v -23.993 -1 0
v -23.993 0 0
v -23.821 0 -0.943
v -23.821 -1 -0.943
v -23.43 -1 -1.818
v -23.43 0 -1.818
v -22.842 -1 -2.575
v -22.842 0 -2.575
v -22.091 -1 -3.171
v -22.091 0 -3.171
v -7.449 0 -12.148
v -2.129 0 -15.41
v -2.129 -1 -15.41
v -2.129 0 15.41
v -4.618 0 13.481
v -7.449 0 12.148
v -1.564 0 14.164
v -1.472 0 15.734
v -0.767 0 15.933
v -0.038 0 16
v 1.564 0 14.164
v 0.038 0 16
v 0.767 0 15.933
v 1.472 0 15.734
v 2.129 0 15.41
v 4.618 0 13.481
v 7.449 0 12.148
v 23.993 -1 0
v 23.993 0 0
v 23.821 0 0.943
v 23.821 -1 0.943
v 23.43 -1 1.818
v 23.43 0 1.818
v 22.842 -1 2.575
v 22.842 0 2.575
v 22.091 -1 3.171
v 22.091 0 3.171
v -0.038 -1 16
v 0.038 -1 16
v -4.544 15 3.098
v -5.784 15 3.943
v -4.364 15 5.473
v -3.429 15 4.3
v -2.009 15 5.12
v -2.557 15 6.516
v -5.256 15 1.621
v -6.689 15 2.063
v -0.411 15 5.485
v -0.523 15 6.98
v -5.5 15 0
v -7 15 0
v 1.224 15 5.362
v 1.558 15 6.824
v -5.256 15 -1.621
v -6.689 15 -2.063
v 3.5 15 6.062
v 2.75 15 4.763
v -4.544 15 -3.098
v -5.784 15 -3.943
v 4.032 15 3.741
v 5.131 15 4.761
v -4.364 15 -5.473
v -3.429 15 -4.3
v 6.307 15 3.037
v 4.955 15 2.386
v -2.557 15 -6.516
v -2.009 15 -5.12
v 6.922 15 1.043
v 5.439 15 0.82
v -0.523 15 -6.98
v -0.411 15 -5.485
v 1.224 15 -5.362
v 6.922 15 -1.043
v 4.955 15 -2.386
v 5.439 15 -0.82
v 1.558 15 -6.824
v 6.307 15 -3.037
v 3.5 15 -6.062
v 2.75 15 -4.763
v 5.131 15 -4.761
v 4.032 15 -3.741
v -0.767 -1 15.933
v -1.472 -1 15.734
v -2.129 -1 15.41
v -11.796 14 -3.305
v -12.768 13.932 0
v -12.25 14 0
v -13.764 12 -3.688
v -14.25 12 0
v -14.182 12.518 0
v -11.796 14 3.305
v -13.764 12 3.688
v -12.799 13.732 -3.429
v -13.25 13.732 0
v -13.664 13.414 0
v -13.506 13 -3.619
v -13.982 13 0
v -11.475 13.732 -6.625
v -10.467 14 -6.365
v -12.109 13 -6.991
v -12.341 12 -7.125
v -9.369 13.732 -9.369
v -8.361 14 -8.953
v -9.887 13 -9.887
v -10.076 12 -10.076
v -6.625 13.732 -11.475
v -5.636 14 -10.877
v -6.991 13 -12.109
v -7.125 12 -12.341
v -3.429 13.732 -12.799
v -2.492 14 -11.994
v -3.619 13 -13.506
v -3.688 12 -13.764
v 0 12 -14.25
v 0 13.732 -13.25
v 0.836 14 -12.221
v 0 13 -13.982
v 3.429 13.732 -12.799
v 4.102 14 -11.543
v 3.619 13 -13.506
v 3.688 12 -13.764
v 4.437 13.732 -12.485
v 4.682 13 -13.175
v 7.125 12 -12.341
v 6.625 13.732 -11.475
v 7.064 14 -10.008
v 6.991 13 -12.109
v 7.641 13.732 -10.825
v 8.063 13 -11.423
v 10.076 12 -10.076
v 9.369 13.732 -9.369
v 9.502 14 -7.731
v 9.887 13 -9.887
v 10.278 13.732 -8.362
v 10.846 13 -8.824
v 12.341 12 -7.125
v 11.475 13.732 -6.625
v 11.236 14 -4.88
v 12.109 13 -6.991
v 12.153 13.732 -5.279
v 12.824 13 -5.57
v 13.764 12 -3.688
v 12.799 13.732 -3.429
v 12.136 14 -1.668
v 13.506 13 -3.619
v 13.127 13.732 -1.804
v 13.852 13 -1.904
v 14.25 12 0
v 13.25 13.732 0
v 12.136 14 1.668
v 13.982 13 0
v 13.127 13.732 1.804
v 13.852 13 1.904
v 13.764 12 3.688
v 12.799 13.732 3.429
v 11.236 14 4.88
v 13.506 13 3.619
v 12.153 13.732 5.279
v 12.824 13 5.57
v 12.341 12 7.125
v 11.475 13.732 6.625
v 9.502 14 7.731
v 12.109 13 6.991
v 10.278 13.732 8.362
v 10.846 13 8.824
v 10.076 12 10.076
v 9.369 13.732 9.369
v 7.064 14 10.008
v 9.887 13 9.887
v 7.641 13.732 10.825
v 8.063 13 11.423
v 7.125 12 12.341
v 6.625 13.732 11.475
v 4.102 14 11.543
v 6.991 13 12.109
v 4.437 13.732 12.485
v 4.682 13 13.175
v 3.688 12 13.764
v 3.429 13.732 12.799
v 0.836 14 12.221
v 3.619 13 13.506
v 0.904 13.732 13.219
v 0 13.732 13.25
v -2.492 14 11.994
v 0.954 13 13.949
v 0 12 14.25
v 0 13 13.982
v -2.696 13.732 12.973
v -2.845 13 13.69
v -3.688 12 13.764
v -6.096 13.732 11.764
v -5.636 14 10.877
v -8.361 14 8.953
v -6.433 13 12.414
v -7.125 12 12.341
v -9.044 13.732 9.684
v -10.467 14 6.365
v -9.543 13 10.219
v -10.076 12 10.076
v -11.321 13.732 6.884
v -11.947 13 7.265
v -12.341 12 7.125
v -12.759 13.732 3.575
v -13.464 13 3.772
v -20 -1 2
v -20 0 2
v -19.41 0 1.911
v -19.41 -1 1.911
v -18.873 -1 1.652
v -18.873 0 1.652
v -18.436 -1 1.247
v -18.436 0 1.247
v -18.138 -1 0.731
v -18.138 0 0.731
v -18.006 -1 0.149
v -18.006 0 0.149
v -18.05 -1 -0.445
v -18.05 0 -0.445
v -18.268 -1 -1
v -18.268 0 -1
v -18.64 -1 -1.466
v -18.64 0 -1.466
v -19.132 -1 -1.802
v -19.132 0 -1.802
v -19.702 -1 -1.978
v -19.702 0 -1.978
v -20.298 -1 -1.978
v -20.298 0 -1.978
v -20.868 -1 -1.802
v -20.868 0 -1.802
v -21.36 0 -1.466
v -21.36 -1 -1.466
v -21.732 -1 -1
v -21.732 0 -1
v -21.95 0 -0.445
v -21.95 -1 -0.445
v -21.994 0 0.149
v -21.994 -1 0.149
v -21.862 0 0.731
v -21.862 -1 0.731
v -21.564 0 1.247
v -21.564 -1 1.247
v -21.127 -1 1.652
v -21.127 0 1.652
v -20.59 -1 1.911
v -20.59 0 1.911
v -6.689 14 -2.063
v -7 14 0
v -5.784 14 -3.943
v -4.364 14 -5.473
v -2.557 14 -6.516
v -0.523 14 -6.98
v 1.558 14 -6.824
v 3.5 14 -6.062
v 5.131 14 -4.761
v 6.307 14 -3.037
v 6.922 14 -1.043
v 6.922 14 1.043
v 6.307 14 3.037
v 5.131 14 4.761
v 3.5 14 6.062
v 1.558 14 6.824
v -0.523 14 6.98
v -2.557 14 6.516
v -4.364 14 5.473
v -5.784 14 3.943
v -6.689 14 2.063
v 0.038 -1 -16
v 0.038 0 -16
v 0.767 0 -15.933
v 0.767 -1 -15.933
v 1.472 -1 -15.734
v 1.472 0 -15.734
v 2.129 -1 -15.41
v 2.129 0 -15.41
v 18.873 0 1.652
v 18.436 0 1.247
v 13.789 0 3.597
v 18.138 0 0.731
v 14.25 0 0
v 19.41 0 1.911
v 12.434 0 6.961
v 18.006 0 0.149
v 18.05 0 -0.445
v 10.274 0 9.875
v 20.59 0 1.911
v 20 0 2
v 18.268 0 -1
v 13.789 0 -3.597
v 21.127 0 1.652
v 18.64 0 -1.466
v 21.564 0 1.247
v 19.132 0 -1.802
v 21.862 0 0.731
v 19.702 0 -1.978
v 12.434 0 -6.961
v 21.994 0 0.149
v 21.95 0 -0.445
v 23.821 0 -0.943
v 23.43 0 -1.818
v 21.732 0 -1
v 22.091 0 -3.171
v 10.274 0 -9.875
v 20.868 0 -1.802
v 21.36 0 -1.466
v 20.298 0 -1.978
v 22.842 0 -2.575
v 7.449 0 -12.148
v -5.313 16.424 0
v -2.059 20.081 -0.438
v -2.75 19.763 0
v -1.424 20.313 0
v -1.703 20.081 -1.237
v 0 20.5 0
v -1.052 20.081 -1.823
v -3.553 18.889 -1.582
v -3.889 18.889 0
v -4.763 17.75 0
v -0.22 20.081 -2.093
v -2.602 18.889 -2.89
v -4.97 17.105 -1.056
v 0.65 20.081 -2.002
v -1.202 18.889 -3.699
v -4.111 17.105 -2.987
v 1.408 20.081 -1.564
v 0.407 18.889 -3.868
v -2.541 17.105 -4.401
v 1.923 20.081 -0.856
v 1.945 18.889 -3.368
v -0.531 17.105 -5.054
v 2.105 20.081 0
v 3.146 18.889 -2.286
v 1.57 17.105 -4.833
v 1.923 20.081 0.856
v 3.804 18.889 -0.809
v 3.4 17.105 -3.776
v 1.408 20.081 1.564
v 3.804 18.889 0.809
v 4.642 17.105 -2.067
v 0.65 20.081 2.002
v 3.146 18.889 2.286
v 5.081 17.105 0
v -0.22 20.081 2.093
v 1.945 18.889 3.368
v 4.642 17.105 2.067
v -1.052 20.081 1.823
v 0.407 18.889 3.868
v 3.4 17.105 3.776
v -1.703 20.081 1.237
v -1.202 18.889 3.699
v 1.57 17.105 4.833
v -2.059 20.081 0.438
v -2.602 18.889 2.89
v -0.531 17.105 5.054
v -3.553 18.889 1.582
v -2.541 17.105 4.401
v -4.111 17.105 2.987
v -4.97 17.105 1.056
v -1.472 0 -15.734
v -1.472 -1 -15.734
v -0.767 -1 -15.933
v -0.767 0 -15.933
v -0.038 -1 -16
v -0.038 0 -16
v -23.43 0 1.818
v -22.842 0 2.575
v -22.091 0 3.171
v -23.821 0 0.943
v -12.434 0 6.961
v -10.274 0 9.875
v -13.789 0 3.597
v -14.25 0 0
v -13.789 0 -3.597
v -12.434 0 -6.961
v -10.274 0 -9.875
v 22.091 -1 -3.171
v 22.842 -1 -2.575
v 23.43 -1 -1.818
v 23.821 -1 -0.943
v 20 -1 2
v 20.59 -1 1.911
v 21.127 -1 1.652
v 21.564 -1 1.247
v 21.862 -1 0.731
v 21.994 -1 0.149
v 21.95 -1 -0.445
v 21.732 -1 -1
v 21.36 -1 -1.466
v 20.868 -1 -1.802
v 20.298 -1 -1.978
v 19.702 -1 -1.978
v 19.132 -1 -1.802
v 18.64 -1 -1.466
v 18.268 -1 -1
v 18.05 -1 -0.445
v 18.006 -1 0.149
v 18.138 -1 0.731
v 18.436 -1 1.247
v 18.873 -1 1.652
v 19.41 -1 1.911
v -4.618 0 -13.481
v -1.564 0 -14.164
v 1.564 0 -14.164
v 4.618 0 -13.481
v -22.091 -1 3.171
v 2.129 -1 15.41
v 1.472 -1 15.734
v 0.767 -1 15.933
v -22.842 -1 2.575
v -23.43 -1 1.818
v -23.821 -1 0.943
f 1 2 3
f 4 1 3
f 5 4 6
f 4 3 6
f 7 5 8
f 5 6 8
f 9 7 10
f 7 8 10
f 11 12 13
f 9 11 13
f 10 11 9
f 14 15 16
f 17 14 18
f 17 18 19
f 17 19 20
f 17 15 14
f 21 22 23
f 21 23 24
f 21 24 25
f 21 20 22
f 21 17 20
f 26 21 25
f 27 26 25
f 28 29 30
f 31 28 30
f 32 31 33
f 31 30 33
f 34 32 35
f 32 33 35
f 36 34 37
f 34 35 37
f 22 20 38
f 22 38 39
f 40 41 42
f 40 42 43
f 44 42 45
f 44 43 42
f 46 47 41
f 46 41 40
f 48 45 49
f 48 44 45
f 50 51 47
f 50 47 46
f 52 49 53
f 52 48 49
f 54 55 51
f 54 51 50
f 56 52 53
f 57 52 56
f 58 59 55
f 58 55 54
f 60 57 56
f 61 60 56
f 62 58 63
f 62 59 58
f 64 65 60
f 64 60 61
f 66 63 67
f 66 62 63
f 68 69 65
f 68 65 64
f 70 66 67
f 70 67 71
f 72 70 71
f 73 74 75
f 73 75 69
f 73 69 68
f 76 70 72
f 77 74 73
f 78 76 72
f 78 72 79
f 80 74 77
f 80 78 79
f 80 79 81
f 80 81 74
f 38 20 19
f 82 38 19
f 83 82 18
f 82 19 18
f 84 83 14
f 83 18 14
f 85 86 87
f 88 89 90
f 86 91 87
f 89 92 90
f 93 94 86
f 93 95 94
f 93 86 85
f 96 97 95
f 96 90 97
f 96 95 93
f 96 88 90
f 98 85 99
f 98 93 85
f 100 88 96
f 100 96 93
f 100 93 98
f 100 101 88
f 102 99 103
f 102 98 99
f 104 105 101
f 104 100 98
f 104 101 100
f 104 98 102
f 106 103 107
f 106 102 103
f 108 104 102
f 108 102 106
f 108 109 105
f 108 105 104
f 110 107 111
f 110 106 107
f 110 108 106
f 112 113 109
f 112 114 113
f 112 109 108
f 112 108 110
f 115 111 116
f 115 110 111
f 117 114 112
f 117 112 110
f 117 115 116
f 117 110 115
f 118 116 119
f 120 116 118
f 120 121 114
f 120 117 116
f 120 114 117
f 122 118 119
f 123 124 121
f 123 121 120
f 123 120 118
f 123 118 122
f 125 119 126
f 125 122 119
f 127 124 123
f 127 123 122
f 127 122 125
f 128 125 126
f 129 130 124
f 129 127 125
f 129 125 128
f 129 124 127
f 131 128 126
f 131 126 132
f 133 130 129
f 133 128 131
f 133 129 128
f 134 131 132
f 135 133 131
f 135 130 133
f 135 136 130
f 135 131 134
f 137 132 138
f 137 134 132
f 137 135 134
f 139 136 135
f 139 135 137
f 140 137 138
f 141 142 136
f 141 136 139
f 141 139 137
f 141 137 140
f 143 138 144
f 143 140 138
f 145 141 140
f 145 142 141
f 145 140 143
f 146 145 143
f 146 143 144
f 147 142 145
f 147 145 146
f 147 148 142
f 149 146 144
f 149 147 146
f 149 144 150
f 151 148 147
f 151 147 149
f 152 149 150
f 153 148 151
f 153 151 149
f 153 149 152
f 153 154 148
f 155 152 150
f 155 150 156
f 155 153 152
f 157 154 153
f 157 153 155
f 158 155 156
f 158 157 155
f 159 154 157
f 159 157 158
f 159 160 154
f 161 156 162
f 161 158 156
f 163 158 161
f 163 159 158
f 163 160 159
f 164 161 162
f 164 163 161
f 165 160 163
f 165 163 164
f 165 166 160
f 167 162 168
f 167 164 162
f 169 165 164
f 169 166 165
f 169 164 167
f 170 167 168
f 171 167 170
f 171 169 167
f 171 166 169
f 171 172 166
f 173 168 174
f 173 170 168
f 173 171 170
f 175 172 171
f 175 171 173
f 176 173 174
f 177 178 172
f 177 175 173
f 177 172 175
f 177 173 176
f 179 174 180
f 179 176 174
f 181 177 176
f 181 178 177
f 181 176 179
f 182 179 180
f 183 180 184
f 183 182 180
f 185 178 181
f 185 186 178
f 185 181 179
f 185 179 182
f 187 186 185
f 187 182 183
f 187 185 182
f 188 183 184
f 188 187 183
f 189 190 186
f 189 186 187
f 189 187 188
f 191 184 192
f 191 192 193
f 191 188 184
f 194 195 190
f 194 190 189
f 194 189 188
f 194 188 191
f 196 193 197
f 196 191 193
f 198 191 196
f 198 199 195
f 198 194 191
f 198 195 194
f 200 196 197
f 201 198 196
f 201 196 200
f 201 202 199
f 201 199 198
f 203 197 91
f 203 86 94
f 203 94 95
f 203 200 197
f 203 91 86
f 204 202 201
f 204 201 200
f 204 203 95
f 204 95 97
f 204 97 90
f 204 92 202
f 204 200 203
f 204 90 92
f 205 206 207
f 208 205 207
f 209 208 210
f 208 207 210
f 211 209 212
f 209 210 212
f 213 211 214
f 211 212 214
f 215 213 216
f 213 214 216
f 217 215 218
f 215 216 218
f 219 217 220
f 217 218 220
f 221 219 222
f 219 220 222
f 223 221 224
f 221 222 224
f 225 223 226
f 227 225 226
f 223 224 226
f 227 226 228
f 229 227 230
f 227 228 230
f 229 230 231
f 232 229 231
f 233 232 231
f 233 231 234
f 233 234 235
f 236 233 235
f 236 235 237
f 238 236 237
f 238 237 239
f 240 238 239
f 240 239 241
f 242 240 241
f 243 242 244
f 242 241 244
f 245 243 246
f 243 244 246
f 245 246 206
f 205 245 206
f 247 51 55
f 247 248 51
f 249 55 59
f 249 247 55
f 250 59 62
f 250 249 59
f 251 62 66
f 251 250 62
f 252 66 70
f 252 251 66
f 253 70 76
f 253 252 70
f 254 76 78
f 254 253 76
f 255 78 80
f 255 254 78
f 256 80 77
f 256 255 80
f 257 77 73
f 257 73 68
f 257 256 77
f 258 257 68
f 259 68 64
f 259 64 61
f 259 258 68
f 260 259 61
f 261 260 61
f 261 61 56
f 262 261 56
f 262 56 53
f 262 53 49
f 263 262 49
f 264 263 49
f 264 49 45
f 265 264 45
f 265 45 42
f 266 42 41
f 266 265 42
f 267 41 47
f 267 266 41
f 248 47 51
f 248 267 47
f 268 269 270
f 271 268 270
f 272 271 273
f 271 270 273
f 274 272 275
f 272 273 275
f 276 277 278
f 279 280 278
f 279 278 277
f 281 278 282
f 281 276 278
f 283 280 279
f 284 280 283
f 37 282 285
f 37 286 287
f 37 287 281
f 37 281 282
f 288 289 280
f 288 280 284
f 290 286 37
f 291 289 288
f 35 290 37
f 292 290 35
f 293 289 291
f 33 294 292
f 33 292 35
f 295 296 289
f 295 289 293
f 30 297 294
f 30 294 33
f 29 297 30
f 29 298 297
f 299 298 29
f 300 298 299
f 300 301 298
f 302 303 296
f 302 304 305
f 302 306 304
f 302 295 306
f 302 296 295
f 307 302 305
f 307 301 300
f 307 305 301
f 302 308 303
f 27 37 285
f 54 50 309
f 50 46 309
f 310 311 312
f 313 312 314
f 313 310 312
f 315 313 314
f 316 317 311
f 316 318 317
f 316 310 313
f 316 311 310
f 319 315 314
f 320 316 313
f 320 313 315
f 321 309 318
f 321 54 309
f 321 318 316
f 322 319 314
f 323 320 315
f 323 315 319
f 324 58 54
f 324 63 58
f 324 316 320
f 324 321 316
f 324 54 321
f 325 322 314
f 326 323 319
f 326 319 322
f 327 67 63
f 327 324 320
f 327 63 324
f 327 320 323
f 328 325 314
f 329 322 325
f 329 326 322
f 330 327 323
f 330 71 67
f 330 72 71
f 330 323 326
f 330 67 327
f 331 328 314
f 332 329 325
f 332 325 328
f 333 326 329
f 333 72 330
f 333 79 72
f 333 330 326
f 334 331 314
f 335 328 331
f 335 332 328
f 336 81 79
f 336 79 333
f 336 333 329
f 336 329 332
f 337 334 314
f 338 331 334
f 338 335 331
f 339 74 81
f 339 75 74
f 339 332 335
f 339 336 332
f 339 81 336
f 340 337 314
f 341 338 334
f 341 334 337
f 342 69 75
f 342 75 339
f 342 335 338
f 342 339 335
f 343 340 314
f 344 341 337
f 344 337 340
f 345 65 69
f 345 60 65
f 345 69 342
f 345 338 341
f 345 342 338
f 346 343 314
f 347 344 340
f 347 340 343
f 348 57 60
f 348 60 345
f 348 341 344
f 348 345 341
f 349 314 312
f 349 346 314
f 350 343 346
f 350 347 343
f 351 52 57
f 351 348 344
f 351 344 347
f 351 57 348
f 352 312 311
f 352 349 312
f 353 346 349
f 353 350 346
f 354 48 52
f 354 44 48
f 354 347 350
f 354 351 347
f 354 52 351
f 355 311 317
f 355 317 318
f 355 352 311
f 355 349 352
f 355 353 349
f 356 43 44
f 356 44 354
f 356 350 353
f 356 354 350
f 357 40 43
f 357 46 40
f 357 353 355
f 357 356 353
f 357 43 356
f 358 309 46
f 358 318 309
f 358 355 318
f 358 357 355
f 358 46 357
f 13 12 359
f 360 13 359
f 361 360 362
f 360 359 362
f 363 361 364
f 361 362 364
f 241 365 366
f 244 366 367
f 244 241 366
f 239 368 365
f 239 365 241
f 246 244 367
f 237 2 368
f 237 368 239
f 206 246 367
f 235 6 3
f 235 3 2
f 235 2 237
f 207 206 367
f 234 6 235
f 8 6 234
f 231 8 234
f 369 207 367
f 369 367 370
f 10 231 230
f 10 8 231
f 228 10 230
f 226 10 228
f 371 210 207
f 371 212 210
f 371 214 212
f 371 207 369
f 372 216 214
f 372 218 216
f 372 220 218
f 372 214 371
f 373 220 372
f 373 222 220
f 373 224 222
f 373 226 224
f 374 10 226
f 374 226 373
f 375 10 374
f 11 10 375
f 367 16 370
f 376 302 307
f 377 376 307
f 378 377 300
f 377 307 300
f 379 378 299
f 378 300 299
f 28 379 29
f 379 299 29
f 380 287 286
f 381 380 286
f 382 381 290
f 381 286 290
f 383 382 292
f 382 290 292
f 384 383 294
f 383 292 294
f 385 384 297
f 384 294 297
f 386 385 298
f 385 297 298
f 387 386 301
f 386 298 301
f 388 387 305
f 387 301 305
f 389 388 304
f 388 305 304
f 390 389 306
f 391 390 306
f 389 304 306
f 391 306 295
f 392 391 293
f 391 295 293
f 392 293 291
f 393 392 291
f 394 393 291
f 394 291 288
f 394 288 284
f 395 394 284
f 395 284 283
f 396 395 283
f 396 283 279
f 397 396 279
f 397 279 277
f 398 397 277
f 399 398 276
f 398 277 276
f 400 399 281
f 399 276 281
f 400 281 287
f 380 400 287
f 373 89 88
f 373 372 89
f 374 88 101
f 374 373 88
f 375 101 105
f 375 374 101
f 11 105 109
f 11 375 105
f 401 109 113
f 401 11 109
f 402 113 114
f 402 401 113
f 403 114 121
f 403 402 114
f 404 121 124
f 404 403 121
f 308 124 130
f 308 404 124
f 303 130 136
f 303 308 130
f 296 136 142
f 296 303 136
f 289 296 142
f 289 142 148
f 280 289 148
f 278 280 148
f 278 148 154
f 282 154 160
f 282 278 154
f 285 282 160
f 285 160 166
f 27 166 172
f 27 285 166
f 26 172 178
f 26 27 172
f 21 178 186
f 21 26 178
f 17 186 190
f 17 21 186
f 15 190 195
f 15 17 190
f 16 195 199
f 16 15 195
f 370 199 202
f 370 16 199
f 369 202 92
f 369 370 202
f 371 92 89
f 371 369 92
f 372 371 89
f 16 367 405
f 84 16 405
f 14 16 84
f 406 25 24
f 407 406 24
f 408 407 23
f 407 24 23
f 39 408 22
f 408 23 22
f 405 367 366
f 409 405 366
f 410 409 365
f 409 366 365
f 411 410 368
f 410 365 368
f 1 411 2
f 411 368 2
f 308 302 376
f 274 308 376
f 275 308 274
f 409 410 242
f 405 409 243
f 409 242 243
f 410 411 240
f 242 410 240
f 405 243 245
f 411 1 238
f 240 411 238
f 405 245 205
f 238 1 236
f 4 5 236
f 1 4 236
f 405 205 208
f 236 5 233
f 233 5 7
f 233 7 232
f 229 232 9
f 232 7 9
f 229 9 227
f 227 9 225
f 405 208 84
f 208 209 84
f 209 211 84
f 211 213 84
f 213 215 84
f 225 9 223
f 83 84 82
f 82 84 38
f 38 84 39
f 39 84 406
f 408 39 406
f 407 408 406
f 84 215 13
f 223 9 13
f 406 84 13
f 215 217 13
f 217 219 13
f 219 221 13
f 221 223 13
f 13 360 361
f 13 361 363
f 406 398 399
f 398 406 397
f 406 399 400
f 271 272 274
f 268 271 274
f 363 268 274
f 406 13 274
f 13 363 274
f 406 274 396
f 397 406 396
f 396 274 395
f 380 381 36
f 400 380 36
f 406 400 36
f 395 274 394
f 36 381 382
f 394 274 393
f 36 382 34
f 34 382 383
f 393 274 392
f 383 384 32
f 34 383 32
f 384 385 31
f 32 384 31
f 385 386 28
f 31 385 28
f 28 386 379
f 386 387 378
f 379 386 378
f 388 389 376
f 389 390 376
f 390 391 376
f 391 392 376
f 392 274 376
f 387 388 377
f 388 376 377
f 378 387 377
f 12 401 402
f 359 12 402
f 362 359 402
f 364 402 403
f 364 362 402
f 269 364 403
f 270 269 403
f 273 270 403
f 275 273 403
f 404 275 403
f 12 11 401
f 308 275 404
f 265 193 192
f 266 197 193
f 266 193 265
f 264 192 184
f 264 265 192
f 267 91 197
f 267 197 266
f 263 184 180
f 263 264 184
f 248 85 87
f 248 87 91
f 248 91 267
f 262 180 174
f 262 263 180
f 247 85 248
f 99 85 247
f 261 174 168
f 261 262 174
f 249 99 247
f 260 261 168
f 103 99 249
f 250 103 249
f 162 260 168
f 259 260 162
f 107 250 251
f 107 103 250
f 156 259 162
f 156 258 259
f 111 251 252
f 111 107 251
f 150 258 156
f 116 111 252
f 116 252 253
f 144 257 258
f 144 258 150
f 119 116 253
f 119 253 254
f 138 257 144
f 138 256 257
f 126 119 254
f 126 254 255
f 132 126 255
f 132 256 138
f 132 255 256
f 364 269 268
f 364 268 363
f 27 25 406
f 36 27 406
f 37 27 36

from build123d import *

# Parameters (mm, degrees)
FILLET_1_R      = 2
SKETCH_2_R      = 2
EXTRUDE_1_DEPTH = 1
FILLET_2_R      = 4


with BuildPart() as part:
    # 스케치1 → 회전1 (revolve)
    with BuildSketch(Plane.XY):
        with BuildLine():
            Line((-5.5, 15), (-7, 15))
            Line((-7, 15), (-7, 14))
            Line((-7, 14), (-14.25, 14))
            Line((-14.25, 14), (-14.25, 0))
            Line((-14.25, 0), (0, 0))
            Line((0, 0), (0, 20.5))
            ThreePointArc((0, 20.5), (-3.889087297, 18.889087297), (-5.5, 15))
        make_face()
    revolve(axis=Axis((0, 20.5, 0), (0, -1, 0)))

    # 필렛1
    fillet_1_edges = [part.edges().sort_by_distance(p)[0] for p in [
        (14.25, 14, 0),
    ]]
    fillet(fillet_1_edges, radius=FILLET_1_R)

    # 스케치2 → 보스-돌출1 (add)
    with BuildSketch(Plane(origin=(0, 0, 0), x_dir=(1, 0, 0), z_dir=(0, 1, 0))):
        Polygon((-1.166627447, 16), (-24, 2), (-24, -2), (-1.166627447, -16), (1.166627447, -16), (24, -2), (24, 2), (1.166627447, 16), align=None)
        with Locations(Location((-20, 0, 0), (0, 0, 270))):
            Circle(SKETCH_2_R, mode=Mode.SUBTRACT)
        with Locations(Location((20, 0, 0), (0, 0, 270))):
            Circle(SKETCH_2_R, mode=Mode.SUBTRACT)
    extrude(amount=-EXTRUDE_1_DEPTH)

    # 필렛2
    # the kernel refuses this fillet: 4 mm, written as the material it takes off along each edge
    with BuildSketch(Plane(origin=(24, 5.598660997, -2), x_dir=(-0.8525122061525764, 0, -0.5227073161539516), z_dir=(0, -1, 0)), Plane(origin=(24, 5.598660997, 2), x_dir=(0, 0, -1), z_dir=(0, -1, 0)), Plane(origin=(-24, 5.598660997, 2), x_dir=(0.852512206152576, 0, 0.5227073161539524), z_dir=(0, -1, 0)), Plane(origin=(-24, 5.598660997, -2), x_dir=(0, 0, 1), z_dir=(0, -1, 0))) as fillet_2_piece_1:
        with BuildLine():
            CenterArc((FILLET_2_R * 0.559866099748, -FILLET_2_R), FILLET_2_R, 90, 58.485971252)
            Line((-FILLET_2_R * 0.292646106405, -FILLET_2_R * 0.477292683846), (0, 0))
            Line((0, 0), (FILLET_2_R * 0.559866099748, 0))
        make_face()
    extrude(amount=12.197321995, mode=Mode.SUBTRACT)
    with BuildSketch(Plane(origin=(1.166627447, 2.821613344, 16), x_dir=(0.8525122061525761, 0, -0.5227073161539519), z_dir=(0, -1, 0)), Plane(origin=(1.166627447, 2.821613344, -16), x_dir=(-1, 0, 0), z_dir=(0, -1, 0)), Plane(origin=(-1.166627447, 2.821613344, -16), x_dir=(-0.8525122061525764, 0, 0.5227073161539515), z_dir=(0, -1, 0))) as fillet_2_piece_2:
        with BuildLine():
            CenterArc((FILLET_2_R * 0.28216133444, -FILLET_2_R), FILLET_2_R, 90, 31.514028748)
            Line((-FILLET_2_R * 0.240545981714, -FILLET_2_R * 0.147487793847), (0, 0))
            Line((0, 0), (FILLET_2_R * 0.28216133444, 0))
        make_face()
    extrude(amount=6.643226689, mode=Mode.SUBTRACT)
    with BuildSketch(Plane(origin=(-1.166627447, 2.821613344, 16), x_dir=(-0.8525122061525756, 0, -0.5227073161539529), z_dir=(0, -1, 0))) as fillet_2_piece_3:
        with BuildLine():
            CenterArc((FILLET_2_R * 0.28216133444, FILLET_2_R), FILLET_2_R, 238.485971252, 31.514028748)
            Line((-FILLET_2_R * 0.240545981714, FILLET_2_R * 0.147487793847), (0, 0))
            Line((0, 0), (FILLET_2_R * 0.28216133444, 0))
        make_face()
    extrude(amount=6.643226689, mode=Mode.SUBTRACT)


solid = part.part
